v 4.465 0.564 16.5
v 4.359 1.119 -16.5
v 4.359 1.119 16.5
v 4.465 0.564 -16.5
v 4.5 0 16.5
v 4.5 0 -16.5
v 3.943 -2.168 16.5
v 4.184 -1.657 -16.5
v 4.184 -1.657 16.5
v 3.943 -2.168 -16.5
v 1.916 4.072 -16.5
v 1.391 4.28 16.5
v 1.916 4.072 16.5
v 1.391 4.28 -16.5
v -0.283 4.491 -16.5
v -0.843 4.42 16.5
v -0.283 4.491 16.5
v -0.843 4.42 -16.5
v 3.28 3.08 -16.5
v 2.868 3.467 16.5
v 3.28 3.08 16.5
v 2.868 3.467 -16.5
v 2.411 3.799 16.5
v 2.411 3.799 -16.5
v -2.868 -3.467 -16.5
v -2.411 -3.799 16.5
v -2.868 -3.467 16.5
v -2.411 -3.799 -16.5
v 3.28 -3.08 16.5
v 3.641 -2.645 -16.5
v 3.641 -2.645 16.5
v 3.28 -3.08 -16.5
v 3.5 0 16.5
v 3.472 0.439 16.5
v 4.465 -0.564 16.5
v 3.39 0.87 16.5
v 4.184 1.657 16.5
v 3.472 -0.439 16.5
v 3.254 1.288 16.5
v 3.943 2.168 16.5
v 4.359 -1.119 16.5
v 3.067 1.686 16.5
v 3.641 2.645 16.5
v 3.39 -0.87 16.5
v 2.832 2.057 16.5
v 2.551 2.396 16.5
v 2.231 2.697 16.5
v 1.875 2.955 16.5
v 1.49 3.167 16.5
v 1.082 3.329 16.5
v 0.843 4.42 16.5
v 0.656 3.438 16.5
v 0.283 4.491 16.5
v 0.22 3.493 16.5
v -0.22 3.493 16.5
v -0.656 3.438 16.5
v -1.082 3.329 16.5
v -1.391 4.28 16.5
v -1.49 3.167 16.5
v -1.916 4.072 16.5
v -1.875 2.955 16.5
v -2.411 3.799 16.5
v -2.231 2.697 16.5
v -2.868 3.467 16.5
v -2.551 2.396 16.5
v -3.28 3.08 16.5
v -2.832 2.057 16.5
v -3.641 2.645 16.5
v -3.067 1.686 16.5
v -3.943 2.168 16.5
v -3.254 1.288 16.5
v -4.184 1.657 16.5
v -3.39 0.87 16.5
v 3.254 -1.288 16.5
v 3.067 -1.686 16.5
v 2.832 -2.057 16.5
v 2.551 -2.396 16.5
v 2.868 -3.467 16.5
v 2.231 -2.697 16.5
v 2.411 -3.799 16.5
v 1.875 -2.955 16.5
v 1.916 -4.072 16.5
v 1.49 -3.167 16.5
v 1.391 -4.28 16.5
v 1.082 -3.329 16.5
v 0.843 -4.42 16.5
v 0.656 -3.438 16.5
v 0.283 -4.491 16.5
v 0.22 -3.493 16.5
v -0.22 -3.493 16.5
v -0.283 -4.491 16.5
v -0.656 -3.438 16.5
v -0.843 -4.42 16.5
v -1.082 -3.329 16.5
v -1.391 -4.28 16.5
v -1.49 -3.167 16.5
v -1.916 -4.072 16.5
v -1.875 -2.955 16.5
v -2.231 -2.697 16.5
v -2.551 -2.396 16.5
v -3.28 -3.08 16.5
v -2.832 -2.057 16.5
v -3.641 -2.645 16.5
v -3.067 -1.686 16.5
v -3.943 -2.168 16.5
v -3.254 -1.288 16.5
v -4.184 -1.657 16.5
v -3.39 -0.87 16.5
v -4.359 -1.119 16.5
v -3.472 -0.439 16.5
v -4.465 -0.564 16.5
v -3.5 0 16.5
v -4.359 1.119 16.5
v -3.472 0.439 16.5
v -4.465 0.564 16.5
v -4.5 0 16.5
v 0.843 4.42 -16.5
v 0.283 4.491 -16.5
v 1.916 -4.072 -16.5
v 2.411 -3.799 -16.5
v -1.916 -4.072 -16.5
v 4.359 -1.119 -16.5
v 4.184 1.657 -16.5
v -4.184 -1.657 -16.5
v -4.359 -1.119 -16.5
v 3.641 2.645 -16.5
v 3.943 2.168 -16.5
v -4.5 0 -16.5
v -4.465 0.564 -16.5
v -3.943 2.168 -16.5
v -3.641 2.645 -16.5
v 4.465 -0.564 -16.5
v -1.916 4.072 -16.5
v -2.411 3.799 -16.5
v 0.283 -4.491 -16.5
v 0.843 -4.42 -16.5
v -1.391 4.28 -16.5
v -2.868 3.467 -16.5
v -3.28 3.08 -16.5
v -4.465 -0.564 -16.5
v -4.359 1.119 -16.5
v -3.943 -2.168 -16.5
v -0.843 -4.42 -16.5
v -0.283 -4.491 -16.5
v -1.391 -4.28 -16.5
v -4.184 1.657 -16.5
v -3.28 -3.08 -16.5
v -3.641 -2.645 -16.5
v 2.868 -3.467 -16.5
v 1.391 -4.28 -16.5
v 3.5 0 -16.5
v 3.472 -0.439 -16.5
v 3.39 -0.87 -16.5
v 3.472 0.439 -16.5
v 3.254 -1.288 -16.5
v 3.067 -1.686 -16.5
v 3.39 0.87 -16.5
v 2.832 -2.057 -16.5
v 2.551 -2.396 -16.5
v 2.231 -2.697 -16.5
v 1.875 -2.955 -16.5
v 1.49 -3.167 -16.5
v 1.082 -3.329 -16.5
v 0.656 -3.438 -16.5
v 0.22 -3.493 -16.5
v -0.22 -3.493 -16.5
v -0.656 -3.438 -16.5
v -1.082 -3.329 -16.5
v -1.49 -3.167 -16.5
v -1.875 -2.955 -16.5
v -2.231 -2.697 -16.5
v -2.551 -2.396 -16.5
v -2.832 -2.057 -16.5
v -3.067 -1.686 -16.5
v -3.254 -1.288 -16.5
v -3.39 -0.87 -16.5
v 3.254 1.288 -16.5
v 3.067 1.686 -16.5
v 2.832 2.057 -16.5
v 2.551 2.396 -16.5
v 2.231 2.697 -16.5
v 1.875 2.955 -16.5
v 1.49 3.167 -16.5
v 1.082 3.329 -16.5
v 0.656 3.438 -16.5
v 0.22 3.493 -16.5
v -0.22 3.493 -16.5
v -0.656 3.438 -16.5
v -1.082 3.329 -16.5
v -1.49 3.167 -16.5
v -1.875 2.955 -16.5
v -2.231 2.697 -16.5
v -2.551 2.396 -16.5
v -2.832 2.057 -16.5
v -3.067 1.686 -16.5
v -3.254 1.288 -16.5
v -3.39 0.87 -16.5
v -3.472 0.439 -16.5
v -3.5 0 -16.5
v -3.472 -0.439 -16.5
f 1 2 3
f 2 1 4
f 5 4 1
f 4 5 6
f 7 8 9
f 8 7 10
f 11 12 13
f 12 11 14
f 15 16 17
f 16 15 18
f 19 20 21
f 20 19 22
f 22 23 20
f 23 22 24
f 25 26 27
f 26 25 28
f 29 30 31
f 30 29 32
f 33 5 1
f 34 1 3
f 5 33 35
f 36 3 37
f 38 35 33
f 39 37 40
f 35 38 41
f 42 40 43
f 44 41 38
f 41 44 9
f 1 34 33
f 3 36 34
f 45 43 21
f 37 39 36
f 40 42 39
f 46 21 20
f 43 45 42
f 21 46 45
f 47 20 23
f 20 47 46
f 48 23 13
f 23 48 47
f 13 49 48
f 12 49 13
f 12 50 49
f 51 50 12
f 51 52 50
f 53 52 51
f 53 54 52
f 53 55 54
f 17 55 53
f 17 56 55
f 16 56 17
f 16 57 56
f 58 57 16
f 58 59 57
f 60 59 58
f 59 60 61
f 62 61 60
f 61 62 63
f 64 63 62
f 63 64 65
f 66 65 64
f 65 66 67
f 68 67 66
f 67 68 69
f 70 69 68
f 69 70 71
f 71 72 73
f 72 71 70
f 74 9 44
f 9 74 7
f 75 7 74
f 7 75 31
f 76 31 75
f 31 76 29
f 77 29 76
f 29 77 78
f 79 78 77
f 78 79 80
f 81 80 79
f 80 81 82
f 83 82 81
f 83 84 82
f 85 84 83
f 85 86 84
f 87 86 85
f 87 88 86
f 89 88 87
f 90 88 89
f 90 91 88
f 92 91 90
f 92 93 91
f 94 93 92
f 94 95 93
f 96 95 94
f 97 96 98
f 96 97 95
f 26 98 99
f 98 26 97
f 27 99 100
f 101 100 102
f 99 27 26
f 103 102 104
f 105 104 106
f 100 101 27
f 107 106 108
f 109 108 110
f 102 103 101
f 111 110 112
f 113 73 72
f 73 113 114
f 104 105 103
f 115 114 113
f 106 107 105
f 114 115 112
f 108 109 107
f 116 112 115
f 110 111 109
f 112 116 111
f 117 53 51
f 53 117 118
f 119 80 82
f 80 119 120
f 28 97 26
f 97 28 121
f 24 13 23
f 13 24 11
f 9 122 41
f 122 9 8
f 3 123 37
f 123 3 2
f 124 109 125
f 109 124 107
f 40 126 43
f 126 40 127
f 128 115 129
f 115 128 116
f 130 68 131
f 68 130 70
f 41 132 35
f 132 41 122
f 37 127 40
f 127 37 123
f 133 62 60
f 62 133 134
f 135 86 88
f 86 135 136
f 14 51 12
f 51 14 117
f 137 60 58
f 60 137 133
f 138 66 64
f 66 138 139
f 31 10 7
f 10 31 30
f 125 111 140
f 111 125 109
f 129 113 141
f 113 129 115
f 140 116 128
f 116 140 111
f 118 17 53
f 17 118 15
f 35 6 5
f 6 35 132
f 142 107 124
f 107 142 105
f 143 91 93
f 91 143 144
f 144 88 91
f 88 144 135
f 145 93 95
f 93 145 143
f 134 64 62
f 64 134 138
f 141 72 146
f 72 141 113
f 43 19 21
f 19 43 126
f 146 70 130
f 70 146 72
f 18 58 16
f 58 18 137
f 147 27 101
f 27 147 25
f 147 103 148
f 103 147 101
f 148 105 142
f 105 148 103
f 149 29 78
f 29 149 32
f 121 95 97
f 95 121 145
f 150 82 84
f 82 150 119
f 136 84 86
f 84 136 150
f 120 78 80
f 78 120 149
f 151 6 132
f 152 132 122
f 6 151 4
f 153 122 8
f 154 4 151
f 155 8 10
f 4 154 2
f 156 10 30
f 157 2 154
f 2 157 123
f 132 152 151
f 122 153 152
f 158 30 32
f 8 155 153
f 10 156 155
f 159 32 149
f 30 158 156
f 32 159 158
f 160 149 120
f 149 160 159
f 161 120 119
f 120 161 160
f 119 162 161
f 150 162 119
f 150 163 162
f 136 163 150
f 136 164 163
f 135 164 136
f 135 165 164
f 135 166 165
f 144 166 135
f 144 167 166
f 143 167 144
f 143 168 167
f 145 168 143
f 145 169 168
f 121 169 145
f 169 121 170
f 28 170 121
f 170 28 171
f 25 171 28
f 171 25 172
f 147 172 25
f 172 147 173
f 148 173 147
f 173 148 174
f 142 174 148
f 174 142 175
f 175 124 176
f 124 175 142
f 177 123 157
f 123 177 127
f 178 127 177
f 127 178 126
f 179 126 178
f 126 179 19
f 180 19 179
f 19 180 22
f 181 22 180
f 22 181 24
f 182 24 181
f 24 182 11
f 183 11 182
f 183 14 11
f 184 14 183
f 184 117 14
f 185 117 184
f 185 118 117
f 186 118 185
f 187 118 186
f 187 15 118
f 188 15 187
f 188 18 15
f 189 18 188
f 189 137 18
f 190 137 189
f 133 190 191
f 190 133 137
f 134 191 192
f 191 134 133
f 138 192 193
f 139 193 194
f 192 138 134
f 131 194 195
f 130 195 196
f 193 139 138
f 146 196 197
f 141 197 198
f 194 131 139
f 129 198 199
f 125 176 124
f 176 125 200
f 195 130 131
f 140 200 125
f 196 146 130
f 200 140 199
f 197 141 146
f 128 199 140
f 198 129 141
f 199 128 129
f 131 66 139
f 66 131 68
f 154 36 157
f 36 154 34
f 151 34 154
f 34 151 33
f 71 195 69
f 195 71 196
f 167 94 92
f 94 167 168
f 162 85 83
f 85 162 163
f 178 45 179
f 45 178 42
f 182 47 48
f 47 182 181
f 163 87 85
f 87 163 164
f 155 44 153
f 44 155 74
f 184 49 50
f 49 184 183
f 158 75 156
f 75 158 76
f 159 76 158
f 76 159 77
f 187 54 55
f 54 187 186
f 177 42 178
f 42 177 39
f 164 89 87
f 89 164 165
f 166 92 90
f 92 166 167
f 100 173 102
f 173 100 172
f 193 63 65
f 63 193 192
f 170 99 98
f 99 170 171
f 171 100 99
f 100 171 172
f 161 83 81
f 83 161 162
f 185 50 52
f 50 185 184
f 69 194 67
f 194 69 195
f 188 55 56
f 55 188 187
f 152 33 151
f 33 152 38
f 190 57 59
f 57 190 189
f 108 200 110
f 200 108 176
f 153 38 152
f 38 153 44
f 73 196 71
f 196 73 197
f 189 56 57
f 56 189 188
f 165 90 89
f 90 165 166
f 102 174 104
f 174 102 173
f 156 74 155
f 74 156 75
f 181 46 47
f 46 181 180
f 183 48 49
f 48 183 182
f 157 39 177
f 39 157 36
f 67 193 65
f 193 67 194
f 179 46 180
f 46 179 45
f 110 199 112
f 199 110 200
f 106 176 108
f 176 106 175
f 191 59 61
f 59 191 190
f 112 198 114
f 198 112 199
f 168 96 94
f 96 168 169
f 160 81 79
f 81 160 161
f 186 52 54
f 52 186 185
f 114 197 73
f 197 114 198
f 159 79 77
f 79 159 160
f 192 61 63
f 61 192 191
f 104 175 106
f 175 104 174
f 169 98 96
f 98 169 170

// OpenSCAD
$fn = 50;


difference() {
	union() {
		translate(v = [0, 0, -16.5000000000]) {
			cylinder(h = 33, r = 4.5000000000);
		}
	}
	union() {
		translate(v = [0, 0, -100.0000000000]) {
			cylinder(h = 200, r = 3.5000000000);
		}
	}
}
